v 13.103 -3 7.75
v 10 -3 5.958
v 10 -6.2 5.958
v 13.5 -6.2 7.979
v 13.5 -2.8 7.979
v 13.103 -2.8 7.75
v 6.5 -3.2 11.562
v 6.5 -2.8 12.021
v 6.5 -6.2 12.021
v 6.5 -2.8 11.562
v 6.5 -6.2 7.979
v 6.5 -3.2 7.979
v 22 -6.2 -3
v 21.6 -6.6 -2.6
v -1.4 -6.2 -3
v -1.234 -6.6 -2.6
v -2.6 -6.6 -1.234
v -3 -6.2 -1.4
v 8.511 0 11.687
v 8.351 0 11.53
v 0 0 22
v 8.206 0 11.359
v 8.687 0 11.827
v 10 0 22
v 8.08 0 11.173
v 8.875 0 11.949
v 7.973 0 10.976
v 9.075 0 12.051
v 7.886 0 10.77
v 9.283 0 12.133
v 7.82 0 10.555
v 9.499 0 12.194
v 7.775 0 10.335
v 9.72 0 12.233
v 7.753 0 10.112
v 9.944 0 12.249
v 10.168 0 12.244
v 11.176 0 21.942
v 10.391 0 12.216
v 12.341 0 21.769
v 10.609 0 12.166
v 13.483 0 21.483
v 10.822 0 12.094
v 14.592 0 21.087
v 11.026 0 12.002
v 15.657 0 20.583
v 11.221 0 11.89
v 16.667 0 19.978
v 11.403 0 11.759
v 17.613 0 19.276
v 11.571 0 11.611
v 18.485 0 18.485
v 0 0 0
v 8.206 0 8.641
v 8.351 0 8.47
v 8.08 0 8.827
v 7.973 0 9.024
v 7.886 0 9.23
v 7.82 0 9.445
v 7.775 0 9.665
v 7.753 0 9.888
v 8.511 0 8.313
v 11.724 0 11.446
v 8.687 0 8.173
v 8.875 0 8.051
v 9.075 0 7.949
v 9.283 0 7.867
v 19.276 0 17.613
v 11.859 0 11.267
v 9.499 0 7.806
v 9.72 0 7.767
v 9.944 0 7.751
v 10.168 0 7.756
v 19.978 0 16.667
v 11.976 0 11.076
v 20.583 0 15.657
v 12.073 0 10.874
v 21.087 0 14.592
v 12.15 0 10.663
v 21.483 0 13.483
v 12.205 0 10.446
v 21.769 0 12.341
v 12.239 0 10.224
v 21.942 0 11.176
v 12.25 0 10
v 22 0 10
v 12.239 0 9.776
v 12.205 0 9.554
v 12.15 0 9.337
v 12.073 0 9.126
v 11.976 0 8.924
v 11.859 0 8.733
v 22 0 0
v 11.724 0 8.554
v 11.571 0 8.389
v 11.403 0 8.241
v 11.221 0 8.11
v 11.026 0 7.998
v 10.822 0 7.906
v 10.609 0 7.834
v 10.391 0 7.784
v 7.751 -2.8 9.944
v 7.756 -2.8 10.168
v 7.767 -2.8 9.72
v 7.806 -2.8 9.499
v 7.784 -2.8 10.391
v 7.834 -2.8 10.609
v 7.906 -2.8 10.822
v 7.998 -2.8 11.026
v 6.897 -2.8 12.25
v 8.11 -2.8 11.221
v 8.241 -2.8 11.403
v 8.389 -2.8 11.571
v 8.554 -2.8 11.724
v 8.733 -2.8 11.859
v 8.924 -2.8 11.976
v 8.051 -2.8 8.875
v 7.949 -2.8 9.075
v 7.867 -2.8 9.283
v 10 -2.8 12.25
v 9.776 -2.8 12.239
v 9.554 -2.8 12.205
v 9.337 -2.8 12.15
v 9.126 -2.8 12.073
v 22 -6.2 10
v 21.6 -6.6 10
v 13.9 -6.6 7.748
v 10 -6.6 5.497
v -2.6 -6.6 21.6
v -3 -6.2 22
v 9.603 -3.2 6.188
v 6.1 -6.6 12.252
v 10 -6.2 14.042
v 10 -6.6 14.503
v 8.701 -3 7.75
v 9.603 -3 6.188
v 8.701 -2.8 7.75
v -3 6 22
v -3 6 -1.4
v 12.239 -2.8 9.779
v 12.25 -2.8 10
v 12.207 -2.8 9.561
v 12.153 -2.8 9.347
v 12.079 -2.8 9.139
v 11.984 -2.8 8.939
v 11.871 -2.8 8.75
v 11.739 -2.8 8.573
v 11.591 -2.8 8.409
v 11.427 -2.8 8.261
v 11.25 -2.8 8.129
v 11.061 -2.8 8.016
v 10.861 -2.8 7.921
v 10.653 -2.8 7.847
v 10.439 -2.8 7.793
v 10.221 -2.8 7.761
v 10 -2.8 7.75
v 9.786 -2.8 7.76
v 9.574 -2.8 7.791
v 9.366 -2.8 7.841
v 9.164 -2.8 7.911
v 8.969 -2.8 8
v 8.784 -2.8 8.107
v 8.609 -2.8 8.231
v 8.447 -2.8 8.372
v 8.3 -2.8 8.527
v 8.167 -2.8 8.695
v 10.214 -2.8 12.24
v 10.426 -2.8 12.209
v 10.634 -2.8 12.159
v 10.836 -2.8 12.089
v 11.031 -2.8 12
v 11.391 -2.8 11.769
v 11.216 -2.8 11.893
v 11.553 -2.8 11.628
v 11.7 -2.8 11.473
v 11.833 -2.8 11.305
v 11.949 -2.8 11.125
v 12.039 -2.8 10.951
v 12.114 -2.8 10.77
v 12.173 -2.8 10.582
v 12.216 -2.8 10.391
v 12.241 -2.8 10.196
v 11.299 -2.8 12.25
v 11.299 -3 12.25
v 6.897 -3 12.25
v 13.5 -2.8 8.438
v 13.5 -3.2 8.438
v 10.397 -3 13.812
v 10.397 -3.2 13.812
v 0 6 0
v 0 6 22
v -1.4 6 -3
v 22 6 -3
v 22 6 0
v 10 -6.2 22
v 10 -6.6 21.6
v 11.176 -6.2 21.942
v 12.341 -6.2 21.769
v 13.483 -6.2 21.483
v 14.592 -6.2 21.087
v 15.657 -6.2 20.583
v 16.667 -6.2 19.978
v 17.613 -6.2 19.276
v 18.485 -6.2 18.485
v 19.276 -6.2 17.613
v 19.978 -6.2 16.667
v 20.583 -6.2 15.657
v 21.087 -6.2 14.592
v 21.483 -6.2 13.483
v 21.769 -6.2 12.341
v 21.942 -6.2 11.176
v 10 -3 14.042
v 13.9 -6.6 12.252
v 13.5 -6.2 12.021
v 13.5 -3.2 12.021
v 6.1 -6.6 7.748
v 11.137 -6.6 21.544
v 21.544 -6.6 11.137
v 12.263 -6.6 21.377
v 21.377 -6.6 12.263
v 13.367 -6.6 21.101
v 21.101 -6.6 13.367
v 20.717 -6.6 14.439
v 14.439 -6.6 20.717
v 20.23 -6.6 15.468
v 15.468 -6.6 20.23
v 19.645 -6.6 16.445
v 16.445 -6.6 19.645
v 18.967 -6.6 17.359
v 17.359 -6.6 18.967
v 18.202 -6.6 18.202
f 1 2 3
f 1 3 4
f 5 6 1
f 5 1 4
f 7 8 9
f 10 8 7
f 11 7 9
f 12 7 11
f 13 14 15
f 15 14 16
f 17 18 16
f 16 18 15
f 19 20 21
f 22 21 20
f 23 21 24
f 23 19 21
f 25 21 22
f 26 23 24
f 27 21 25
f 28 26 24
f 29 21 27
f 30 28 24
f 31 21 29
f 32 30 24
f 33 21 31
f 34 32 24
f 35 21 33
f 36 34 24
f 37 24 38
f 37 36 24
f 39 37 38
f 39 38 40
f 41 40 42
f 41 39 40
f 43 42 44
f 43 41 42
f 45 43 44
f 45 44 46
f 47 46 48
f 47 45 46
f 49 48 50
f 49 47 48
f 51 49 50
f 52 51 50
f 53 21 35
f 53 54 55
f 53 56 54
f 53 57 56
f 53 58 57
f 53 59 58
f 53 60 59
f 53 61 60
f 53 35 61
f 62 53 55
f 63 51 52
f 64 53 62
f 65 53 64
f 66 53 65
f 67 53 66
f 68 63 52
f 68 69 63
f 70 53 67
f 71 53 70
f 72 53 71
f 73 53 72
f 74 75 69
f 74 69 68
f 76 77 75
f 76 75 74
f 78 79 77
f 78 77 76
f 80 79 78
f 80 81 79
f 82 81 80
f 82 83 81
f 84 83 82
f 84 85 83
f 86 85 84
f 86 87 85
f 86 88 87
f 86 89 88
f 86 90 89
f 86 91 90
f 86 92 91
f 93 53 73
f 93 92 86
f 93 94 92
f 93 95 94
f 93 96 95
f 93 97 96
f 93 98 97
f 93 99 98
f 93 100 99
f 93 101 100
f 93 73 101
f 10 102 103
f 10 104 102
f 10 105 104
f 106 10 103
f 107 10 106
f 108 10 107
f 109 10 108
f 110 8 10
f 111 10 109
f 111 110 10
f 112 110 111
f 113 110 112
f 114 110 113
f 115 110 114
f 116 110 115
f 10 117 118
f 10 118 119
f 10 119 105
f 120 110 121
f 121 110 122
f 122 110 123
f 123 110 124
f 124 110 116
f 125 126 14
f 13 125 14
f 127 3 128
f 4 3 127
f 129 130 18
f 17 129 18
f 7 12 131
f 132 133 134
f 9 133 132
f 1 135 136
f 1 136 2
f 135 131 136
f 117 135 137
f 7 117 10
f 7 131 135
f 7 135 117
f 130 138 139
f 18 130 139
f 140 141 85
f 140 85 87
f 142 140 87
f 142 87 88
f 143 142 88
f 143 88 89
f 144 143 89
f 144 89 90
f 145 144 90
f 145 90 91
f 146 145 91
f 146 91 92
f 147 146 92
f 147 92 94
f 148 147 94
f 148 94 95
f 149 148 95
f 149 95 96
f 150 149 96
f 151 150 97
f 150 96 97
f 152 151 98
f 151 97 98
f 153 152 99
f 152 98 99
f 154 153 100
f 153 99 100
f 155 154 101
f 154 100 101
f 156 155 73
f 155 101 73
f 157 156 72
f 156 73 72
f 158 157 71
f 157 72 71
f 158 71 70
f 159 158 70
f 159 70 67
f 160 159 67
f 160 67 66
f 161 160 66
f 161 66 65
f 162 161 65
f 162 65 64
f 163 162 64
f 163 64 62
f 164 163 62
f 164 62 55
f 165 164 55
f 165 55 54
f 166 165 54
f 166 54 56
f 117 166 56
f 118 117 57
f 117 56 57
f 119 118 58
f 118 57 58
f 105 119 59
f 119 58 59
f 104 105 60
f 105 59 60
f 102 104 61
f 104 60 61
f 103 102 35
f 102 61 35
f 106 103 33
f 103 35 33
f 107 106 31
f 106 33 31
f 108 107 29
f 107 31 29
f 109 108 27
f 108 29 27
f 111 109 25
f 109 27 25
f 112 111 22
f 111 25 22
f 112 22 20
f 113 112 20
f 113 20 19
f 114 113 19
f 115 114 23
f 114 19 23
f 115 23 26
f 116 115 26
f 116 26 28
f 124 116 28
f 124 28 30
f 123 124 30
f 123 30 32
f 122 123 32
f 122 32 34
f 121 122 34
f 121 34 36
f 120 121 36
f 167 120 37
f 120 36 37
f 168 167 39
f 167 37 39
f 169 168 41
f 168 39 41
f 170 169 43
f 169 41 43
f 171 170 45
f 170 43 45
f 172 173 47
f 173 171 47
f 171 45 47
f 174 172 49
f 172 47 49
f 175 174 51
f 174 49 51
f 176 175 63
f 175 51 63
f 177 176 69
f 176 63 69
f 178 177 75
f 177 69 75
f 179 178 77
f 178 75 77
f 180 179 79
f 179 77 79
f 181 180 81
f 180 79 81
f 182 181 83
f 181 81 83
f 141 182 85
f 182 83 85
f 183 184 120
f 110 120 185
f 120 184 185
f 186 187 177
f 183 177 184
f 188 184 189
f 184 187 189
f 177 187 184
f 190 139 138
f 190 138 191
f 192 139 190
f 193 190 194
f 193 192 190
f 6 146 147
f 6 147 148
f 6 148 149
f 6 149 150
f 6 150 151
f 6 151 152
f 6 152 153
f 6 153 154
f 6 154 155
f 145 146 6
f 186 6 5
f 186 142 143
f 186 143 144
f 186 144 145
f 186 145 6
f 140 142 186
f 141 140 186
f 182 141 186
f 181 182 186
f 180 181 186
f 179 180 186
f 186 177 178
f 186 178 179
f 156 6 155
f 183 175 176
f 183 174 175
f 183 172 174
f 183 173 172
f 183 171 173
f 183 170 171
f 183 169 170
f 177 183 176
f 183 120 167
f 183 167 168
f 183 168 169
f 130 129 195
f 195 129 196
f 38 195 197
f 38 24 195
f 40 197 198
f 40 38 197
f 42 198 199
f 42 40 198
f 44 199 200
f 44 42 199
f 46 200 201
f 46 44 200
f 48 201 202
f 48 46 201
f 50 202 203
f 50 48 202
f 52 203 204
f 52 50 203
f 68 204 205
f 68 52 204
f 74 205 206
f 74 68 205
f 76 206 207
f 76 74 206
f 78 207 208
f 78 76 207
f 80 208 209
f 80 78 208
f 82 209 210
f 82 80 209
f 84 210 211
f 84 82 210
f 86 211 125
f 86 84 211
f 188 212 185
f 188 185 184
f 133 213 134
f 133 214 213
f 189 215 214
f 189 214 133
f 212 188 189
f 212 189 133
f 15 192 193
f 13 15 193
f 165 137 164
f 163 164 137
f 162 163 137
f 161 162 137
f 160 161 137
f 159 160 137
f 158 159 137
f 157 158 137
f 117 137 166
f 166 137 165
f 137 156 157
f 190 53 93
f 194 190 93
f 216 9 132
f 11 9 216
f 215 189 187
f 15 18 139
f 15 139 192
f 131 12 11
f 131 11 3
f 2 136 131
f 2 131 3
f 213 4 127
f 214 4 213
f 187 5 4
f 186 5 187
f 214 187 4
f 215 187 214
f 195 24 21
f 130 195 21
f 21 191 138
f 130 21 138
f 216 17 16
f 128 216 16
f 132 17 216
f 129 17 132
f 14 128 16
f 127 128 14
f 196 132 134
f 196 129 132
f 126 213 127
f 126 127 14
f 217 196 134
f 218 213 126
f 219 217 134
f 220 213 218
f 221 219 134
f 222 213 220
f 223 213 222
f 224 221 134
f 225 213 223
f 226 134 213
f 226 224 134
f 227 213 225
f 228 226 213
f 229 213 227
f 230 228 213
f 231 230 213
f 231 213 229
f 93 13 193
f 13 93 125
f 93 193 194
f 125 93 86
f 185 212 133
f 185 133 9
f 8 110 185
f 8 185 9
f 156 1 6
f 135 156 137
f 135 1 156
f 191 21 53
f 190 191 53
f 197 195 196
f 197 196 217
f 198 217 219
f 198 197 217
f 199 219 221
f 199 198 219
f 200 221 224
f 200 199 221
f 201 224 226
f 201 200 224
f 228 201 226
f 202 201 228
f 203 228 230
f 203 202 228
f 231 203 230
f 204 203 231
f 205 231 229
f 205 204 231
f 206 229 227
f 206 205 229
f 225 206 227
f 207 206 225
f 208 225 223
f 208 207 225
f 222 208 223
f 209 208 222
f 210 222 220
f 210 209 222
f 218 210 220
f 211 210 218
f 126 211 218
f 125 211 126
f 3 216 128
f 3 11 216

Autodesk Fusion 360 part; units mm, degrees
sketch "Sketch1" plane through (0, 0, 0) normal (0, 1, 0) x (1, 0, 0)
  circle A0 centre (10, -10) radius 2.25
  line L0 (-3, 3) -> (22, 3)
  line L1 (-3, 3) -> (-3, -22)
  line L2 (0, 0) -> (22, 0)
  line L3 (22, 0) -> (22, -22)
  line L4 (22, -22) -> (0, -22)
  line L5 (0, -22) -> (0, 0)
  line L6 (22, 3) -> (22, 0)
  line L7 (-3, -22) -> (0, -22)
  dimension "d1" = 4.5
  dimension "d2" = 10
  dimension "d3" = 10
  dimension "d4" = 3
  dimension "d5" = 3
  dimension "d6" = 22
  dimension "d7" = 22
  dimension "d8" = 25
  dimension "d9" = 25
extrude "Extrude1" add sketch "Sketch1" along normal blind 6 contours L0 L1 L2 L5 L6 L7
extrude "Extrude2" add sketch "Sketch1" against normal blind 3.2
chamfer "Chamfer1" distance 1.6 angle 45 1 edges at (-3, 1.4, -3)
fillet "Fillet1" radius 12 1 edges at (22, -1.6, 22)
sketch "Sketch2" plane through (0, -3.2, 0) normal (0, -1, 0) x (1, 0, 0)
  circle A0 centre (10, 10) radius 2.25
  arc A1 (22, 10) -> (10, 22) centre (10, 10) ccw
  line L0 (10, 22) -> (-3, 22)
  line L1 (-3, 22) -> (-3, -1.4)
  line L2 (-3, -1.4) -> (-1.4, -3)
  line L3 (-1.4, -3) -> (22, -3)
  line L4 (22, -3) -> (22, 10)
  circle A2 centre (10, 10) radius 2.25
  line L5 (10, 5.9585) -> (13.5, 7.9793)
  line L6 (13.5, 7.9793) -> (13.5, 12.0207)
  line L7 (13.5, 12.0207) -> (10, 14.0415)
  line L8 (10, 14.0415) -> (6.5, 12.0207)
  line L9 (6.5, 12.0207) -> (6.5, 7.9793)
  line L10 (6.5, 7.9793) -> (10, 5.9585)
  point P0 (10, 10)
  dimension "d17" = 3.5
extrude "Extrude3" add sketch "Sketch2" along normal blind 3.4 contours A1 L0 L1 L2 L3 L4
sketch "Sketch3" plane through (0, -3.2, 0) normal (0, -1, 0) x (1, 0, 0)
  line L0 (10, 5.9585) -> (13.5, 7.9793)
  line L1 (13.5, 7.9793) -> (13.5, 12.0207)
  line L2 (13.5, 12.0207) -> (10, 14.0415)
  line L3 (10, 14.0415) -> (6.5, 12.0207)
  line L4 (6.5, 12.0207) -> (6.5, 7.9793)
  line L5 (6.5, 7.9793) -> (10, 5.9585)
  circle A0 centre (10, 10) radius 2.25
  line L6 (9.6029, 6.1878) -> (6.5, 11.5622)
  line L7 (13.5, 8.4378) -> (10.3971, 13.8122)
  line L8 (13.1029, 7.75) -> (6.8971, 7.75)
  line L9 (13.1029, 12.25) -> (6.8971, 12.25)
  circle A1 centre (10, 10) radius 2.25
extrude "Extrude4" cut sketch "Sketch3" against normal blind 0.4 contours L0 L1 A0 L7 L8 A1 | A0 L6 L8 A1 | L3 L4 A0 L6 L9 A1 | A0 L7 L9 A1
extrude "Extrude5" cut sketch "Sketch3" against normal blind 0.2 contours L0 L5 L6 L8 | L2 L3 L7 L9
chamfer "Chamfer2" distance 0.4 angle 45 1 faces at (0.1667, -6.6, 10.8736)
equation "d17 = ( 7 / 2 ) * 1 mm"
